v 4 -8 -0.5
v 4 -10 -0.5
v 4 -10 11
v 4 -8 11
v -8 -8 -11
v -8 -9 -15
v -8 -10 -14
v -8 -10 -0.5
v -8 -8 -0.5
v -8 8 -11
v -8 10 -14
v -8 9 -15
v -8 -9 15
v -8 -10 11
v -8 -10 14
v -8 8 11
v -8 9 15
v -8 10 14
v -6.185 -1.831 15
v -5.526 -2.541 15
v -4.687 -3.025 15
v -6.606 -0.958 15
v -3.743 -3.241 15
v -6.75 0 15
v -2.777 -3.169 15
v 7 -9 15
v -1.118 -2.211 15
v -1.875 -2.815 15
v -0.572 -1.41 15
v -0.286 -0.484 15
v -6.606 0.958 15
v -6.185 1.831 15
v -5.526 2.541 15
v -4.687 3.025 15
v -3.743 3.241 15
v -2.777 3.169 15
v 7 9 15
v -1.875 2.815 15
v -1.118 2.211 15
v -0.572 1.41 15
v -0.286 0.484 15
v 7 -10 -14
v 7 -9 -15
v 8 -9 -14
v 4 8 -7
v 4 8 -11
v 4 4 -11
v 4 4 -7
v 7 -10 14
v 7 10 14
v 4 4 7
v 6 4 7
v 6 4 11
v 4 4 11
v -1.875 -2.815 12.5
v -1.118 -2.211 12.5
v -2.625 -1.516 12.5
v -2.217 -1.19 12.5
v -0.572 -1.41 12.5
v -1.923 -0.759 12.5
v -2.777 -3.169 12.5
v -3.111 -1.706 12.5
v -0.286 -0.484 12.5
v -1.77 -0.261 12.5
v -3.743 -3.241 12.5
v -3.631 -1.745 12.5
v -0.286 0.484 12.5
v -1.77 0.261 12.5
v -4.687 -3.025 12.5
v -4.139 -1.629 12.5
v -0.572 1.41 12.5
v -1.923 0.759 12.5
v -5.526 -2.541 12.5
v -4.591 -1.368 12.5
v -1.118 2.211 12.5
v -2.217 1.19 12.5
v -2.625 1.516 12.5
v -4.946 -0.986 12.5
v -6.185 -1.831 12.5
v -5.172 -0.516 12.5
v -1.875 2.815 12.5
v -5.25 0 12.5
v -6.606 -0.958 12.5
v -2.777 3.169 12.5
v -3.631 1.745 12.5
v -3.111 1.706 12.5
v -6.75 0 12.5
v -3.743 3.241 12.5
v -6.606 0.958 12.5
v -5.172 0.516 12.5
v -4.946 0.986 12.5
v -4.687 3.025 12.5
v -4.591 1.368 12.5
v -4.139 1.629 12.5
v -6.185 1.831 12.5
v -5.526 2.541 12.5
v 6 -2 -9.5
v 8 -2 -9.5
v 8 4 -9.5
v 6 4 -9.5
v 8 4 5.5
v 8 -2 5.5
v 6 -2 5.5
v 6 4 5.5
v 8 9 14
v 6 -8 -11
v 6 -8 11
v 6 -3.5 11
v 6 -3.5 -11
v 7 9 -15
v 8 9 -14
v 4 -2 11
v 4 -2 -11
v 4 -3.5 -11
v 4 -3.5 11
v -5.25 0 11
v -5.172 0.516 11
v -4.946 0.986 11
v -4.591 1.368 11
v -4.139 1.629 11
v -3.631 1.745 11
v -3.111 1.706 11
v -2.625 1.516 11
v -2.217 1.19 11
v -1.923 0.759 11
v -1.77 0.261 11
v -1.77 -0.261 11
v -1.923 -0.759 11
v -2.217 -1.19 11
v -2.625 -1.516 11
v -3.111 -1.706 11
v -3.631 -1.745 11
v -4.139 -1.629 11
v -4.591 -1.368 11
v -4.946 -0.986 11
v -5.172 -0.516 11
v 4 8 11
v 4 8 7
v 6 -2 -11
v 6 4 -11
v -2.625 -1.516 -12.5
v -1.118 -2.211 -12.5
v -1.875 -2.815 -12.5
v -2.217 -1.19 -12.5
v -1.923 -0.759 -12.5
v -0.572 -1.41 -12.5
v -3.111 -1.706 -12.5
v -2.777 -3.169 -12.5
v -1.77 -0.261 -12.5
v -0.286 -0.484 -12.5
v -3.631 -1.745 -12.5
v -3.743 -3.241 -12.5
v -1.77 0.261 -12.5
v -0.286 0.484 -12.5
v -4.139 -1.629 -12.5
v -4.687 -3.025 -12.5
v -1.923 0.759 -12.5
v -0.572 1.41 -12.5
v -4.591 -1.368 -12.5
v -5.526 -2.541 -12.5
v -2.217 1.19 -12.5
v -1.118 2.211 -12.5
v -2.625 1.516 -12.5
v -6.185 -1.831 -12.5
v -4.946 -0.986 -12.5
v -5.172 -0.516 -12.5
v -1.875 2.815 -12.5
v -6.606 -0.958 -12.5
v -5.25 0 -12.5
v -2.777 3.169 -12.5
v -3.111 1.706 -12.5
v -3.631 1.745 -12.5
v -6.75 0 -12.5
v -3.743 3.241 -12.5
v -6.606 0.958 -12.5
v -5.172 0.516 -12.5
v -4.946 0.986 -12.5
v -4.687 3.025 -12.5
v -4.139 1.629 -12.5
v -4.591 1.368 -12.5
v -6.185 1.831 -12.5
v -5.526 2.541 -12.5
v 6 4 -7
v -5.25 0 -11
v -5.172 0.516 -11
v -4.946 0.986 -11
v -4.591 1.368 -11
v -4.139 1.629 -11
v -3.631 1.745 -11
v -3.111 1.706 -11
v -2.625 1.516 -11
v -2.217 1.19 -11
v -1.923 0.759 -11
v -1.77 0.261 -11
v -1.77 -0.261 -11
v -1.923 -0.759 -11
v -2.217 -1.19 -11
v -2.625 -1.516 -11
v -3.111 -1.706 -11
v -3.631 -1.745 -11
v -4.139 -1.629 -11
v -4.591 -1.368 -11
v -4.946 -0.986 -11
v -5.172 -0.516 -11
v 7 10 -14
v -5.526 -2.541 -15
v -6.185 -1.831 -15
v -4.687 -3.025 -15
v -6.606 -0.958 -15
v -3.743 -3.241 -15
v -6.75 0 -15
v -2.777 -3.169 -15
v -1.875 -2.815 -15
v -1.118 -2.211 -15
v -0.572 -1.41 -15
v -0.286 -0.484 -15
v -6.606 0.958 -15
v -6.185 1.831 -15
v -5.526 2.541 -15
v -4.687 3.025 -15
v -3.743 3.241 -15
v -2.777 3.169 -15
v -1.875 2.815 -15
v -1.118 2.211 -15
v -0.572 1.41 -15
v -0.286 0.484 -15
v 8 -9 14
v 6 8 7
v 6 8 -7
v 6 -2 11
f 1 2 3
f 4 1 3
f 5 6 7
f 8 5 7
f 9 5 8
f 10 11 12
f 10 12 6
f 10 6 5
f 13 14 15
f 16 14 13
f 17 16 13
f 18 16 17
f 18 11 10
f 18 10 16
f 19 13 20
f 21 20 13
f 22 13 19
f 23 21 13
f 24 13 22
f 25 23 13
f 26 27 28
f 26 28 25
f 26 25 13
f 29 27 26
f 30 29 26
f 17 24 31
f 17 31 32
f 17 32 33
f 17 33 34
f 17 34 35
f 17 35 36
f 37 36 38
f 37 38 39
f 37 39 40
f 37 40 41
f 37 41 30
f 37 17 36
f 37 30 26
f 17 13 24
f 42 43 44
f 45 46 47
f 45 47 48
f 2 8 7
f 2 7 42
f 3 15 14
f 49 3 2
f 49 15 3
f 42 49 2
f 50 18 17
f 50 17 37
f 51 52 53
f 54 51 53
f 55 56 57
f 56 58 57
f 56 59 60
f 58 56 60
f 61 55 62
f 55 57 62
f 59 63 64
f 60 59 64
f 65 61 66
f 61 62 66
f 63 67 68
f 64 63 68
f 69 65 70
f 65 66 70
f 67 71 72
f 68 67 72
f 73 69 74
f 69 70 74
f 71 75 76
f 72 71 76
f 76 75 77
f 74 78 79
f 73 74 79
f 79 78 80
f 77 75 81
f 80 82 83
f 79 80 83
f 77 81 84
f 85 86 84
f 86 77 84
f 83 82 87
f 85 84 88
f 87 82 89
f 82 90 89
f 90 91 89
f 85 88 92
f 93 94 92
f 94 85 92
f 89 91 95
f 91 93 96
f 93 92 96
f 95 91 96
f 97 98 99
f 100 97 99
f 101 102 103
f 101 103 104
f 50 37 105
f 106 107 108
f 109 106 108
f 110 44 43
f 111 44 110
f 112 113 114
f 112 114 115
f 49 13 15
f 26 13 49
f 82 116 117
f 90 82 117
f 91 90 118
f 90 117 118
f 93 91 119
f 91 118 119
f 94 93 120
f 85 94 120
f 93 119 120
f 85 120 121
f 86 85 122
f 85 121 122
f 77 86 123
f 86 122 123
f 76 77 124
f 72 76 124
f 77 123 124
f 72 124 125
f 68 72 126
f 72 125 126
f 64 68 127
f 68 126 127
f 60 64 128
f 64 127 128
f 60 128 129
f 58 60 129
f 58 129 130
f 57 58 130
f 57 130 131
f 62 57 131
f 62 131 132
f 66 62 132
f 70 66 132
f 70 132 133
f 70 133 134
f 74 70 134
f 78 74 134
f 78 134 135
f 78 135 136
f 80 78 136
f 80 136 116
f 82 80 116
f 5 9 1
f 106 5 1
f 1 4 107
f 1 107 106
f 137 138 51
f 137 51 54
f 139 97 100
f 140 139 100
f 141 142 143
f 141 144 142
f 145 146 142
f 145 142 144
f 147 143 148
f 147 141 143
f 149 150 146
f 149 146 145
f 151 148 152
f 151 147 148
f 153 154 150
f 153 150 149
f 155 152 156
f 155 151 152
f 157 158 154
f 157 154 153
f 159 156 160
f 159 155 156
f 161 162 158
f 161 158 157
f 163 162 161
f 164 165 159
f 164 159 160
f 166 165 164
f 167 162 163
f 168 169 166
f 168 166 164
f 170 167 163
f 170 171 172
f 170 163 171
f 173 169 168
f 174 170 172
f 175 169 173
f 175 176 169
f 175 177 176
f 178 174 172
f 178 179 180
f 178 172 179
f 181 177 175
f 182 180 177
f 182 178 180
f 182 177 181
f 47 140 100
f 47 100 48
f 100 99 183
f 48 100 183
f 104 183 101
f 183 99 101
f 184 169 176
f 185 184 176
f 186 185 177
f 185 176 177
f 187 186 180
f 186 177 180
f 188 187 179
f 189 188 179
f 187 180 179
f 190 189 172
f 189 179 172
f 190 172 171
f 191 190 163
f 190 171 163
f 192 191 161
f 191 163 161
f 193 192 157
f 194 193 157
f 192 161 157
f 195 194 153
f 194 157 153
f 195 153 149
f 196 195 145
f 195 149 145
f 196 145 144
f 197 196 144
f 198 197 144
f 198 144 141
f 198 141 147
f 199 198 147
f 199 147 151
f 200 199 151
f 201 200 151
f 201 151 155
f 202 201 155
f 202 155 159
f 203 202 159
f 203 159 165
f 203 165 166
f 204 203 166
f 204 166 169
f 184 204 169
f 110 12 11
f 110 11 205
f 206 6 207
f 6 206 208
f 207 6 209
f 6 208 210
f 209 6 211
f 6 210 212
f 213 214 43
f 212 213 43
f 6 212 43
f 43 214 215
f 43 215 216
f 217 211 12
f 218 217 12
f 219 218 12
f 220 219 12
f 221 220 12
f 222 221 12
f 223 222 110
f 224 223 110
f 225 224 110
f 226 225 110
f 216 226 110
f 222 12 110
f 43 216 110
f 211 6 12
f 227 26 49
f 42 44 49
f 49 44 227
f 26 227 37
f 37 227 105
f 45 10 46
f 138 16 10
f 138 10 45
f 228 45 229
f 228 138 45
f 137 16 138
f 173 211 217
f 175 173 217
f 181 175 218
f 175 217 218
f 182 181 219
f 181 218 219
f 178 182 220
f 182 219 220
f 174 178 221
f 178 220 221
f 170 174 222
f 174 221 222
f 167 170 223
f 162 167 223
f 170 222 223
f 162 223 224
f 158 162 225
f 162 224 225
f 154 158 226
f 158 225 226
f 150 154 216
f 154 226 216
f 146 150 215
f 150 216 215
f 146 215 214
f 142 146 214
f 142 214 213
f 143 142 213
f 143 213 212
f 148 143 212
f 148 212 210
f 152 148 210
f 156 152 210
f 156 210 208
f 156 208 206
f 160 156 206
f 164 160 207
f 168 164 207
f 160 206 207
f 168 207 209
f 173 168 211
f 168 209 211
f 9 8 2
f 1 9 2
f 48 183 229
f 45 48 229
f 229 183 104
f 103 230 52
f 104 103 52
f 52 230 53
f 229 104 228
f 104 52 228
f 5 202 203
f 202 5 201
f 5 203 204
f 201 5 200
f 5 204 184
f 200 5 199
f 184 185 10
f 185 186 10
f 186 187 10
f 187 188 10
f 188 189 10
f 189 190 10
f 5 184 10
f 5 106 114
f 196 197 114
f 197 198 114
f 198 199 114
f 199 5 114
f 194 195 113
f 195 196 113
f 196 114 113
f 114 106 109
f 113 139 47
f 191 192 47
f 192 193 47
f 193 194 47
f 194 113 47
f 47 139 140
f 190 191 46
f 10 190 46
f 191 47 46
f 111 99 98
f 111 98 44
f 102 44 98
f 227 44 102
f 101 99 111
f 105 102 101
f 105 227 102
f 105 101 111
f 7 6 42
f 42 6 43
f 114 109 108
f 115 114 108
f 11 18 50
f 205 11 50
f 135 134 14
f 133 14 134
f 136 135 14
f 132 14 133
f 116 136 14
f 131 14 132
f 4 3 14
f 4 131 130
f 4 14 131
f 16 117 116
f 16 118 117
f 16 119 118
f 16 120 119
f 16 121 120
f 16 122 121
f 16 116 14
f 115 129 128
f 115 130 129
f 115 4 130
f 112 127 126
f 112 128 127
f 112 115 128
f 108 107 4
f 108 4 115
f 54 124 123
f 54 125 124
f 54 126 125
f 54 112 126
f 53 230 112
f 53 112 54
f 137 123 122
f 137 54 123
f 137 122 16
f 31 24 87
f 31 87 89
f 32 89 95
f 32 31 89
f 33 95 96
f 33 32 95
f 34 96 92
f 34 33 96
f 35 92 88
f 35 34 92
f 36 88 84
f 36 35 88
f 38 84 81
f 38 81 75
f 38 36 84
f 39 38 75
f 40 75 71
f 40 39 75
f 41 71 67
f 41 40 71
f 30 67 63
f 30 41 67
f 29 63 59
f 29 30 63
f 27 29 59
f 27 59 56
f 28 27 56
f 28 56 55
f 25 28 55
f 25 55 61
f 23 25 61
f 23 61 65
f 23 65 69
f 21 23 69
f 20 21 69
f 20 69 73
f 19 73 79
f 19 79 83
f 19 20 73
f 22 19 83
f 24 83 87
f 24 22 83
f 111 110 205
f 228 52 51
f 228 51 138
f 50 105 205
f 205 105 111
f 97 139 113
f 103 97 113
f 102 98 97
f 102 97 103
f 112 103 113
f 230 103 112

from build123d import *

# Parameters (mm, degrees)
SKETCH1_W           = 16
SKETCH1_H           = 20
BOSS_EXTRUDE1_DEPTH = 15
SHELL1_T            = -2
SKETCH10_W          = 2
SKETCH10_H          = 16
BOSS_EXTRUDE4_DEPTH = 14
CUT_EXTRUDE2_REACH  = 32.726
SKETCH3_W           = 15
SKETCH3_H           = 6
CHAMFER1_SIZE       = 1
SKETCH4_W           = 4
SKETCH4_H           = 4
SKETCH4_W_2         = 22
SKETCH4_H_2         = 1.5
BOSS_EXTRUDE2_DEPTH = 2
CUT_EXTRUDE3_REACH  = 28.249
SKETCH5_W           = 12
SKETCH5_H           = 11.5
SKETCH8_R           = 1.75
CUT_EXTRUDE5_DEPTH  = 33.619012861
SKETCH9_R           = 3.25
CUT_EXTRUDE6_DEPTH  = 2.5


with BuildPart() as part:
    # Sketch1 → Boss-Extrude1 (new, symmetric)
    with BuildSketch(Plane.XY):
        Rectangle(SKETCH1_W, SKETCH1_H)
    extrude(amount=BOSS_EXTRUDE1_DEPTH, both=True)

    # Shell1
    shell1_openings = [part.faces().sort_by_distance(p)[0] for p in [
        (-8, 0, 0),
    ]]
    offset(amount=SHELL1_T, openings=shell1_openings, kind=Kind.INTERSECTION)

    # Sketch10 → Boss-Extrude4 (add)
    with BuildSketch(Plane.ZY.offset(-6)):
        with Locations((-12, 0)):
            Rectangle(SKETCH10_W, SKETCH10_H)
        with Locations((12, 0)):
            Rectangle(SKETCH10_W, SKETCH10_H)
    extrude(amount=BOSS_EXTRUDE4_DEPTH)

    # Sketch3 → Cut-Extrude2 (cut, up to next)
    with BuildSketch(Plane(origin=(8, 0, 9.25), x_dir=(0, 0, 1), z_dir=(-1, 0, 0)), mode=Mode.PRIVATE) as cut_extrude2_sk1:
        with Locations((-11.25, 1)):
            Rectangle(SKETCH3_W, SKETCH3_H)
    cut_extrude2_tool1 = extrude(cut_extrude2_sk1.sketch, amount=CUT_EXTRUDE2_REACH, mode=Mode.PRIVATE) & part.part
    add(cut_extrude2_tool1.solids().sort_by_distance((8, 1, -2))[0], mode=Mode.SUBTRACT)

    # Chamfer1
    chamfer1_edges = [part.edges().sort_by_distance(p)[0] for p in [
        (0, -10, 15),
        (8, 0, 15),
        (0, -10, -15),
        (0, 10, -15),
        (8, 0, -15),
        (0, 10, 15),
        (8, -10, 0),
        (8, 10, 0),
    ]]
    chamfer(chamfer1_edges, length=CHAMFER1_SIZE)

    # Sketch4 → Boss-Extrude2 (add)
    with BuildSketch(Plane.ZY.offset(-6)):
        with Locations((-9, 6)):
            Rectangle(SKETCH4_W, SKETCH4_H)
        with Locations((9, 6)):
            Rectangle(SKETCH4_W, SKETCH4_H)
        with Locations((0, -2.75)):
            Rectangle(SKETCH4_W_2, SKETCH4_H_2)
    extrude(amount=BOSS_EXTRUDE2_DEPTH)

    # Sketch5 → Cut-Extrude3 (cut, up to next)
    with BuildSketch(Plane.XZ.offset(10), mode=Mode.PRIVATE) as cut_extrude3_sk1:
        with Locations((-2, 5.25)):
            Rectangle(SKETCH5_W, SKETCH5_H)
    cut_extrude3_tool1 = extrude(cut_extrude3_sk1.sketch, amount=-CUT_EXTRUDE3_REACH, mode=Mode.PRIVATE) & part.part
    add(cut_extrude3_tool1.solids().sort_by_distance((-2, -10, 5.25))[0], mode=Mode.SUBTRACT)

    # Sketch8 → Cut-Extrude5 (cut, through all)
    with BuildSketch(Plane(origin=(0, 0, -15), x_dir=(-1, 0, 0), z_dir=(0, 0, -1))):
        with Locations((3.5, 0)):
            Circle(SKETCH8_R)
    extrude(amount=-CUT_EXTRUDE5_DEPTH, mode=Mode.SUBTRACT)

    # Sketch9 → Cut-Extrude6 (cut)
    with BuildSketch(Plane(origin=(0, 0, -15), x_dir=(-1, 0, 0), z_dir=(0, 0, -1))):
        with Locations((3.5, 0)):
            Circle(SKETCH9_R)
    cut_extrude6 = extrude(amount=-CUT_EXTRUDE6_DEPTH, mode=Mode.SUBTRACT)

    # Mirror1: Cut-Extrude6 across plane
    add(cut_extrude6.mirror(Plane.XY), mode=Mode.SUBTRACT)


solid = part.part
